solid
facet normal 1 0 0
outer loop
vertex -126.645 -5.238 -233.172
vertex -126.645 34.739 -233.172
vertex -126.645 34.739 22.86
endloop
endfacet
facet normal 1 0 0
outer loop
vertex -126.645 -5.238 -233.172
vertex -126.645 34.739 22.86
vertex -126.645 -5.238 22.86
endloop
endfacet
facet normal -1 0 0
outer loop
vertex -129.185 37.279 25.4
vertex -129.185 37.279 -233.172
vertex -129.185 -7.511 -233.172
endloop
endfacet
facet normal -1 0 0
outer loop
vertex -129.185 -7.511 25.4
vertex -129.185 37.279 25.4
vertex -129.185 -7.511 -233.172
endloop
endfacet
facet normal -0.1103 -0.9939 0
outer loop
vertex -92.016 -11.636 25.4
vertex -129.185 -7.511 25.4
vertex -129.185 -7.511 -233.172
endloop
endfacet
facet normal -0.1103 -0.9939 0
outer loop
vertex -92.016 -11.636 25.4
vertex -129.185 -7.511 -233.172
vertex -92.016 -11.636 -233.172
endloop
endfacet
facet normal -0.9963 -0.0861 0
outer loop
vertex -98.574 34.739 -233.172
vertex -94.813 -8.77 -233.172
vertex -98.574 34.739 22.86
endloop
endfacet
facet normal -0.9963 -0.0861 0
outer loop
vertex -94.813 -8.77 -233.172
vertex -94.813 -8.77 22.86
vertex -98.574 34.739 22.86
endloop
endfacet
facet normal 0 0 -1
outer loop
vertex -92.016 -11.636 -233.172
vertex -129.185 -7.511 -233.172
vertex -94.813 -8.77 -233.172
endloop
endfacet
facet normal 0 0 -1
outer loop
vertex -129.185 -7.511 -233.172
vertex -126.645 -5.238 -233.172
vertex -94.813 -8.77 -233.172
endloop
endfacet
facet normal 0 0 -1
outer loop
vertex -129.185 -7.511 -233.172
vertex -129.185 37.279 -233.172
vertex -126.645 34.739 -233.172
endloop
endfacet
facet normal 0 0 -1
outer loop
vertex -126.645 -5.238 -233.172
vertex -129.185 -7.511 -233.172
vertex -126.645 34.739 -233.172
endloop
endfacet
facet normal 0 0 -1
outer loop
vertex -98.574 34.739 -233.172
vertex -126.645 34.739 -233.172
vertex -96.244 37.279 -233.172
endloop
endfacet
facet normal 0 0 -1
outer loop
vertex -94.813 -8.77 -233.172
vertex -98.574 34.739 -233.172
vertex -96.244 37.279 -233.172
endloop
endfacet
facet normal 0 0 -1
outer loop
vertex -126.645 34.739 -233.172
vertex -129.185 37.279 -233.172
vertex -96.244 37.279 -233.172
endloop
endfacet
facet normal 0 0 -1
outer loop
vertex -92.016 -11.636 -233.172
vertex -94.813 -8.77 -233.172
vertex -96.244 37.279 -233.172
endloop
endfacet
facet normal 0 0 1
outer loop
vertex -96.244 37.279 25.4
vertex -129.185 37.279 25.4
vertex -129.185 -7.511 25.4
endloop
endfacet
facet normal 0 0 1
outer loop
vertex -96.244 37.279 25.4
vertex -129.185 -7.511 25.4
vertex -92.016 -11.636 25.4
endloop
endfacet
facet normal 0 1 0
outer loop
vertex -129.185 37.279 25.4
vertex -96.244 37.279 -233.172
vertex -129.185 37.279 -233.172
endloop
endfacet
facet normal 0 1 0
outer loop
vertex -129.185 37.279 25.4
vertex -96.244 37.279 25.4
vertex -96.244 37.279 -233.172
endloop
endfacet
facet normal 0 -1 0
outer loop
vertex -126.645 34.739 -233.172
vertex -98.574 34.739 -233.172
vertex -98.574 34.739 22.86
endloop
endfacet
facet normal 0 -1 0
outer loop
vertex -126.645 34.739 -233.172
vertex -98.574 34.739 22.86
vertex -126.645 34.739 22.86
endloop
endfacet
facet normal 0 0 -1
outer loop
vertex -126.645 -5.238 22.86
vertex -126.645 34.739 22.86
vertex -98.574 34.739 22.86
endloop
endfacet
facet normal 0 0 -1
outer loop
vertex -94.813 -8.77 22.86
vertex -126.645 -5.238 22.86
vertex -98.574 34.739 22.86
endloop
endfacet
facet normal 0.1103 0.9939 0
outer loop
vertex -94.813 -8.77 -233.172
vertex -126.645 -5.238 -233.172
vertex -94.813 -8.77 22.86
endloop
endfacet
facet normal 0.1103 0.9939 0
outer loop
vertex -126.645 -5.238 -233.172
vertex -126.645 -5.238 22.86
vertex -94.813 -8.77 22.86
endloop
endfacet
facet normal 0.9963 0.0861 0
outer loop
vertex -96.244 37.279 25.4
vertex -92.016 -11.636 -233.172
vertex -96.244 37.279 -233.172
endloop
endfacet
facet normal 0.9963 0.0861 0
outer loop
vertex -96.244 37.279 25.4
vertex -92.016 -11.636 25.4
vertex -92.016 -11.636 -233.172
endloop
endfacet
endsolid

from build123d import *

# Parameters (mm, degrees)
F1_DEPTH = 25.4
F2_DEPTH = 233.172
F3_T     = -2.54


with BuildPart() as f1:
    # F0 (on Top) → F1 (new body)
    with BuildSketch(Plane.XY):
        Polygon((-96.244343, 37.27863), (-129.184976, 37.27863), (-129.184976, -7.511258), (-92.015967, -11.636118), align=None)
    extrude(amount=F1_DEPTH)

    # F0 (on Top) → F2 (join)
    with BuildSketch(Plane.XY):
        Polygon((-96.244343, 37.27863), (-129.184976, 37.27863), (-129.184976, -7.511258), (-92.015967, -11.636118), align=None)
    extrude(amount=-F2_DEPTH)

    # F3
    f3_openings = [f1.faces().sort_by_distance(p)[0] for p in [
        (-111.394879, 13.386796, -233.172),
    ]]
    offset(amount=F3_T, openings=f3_openings)


solid = f1.part
